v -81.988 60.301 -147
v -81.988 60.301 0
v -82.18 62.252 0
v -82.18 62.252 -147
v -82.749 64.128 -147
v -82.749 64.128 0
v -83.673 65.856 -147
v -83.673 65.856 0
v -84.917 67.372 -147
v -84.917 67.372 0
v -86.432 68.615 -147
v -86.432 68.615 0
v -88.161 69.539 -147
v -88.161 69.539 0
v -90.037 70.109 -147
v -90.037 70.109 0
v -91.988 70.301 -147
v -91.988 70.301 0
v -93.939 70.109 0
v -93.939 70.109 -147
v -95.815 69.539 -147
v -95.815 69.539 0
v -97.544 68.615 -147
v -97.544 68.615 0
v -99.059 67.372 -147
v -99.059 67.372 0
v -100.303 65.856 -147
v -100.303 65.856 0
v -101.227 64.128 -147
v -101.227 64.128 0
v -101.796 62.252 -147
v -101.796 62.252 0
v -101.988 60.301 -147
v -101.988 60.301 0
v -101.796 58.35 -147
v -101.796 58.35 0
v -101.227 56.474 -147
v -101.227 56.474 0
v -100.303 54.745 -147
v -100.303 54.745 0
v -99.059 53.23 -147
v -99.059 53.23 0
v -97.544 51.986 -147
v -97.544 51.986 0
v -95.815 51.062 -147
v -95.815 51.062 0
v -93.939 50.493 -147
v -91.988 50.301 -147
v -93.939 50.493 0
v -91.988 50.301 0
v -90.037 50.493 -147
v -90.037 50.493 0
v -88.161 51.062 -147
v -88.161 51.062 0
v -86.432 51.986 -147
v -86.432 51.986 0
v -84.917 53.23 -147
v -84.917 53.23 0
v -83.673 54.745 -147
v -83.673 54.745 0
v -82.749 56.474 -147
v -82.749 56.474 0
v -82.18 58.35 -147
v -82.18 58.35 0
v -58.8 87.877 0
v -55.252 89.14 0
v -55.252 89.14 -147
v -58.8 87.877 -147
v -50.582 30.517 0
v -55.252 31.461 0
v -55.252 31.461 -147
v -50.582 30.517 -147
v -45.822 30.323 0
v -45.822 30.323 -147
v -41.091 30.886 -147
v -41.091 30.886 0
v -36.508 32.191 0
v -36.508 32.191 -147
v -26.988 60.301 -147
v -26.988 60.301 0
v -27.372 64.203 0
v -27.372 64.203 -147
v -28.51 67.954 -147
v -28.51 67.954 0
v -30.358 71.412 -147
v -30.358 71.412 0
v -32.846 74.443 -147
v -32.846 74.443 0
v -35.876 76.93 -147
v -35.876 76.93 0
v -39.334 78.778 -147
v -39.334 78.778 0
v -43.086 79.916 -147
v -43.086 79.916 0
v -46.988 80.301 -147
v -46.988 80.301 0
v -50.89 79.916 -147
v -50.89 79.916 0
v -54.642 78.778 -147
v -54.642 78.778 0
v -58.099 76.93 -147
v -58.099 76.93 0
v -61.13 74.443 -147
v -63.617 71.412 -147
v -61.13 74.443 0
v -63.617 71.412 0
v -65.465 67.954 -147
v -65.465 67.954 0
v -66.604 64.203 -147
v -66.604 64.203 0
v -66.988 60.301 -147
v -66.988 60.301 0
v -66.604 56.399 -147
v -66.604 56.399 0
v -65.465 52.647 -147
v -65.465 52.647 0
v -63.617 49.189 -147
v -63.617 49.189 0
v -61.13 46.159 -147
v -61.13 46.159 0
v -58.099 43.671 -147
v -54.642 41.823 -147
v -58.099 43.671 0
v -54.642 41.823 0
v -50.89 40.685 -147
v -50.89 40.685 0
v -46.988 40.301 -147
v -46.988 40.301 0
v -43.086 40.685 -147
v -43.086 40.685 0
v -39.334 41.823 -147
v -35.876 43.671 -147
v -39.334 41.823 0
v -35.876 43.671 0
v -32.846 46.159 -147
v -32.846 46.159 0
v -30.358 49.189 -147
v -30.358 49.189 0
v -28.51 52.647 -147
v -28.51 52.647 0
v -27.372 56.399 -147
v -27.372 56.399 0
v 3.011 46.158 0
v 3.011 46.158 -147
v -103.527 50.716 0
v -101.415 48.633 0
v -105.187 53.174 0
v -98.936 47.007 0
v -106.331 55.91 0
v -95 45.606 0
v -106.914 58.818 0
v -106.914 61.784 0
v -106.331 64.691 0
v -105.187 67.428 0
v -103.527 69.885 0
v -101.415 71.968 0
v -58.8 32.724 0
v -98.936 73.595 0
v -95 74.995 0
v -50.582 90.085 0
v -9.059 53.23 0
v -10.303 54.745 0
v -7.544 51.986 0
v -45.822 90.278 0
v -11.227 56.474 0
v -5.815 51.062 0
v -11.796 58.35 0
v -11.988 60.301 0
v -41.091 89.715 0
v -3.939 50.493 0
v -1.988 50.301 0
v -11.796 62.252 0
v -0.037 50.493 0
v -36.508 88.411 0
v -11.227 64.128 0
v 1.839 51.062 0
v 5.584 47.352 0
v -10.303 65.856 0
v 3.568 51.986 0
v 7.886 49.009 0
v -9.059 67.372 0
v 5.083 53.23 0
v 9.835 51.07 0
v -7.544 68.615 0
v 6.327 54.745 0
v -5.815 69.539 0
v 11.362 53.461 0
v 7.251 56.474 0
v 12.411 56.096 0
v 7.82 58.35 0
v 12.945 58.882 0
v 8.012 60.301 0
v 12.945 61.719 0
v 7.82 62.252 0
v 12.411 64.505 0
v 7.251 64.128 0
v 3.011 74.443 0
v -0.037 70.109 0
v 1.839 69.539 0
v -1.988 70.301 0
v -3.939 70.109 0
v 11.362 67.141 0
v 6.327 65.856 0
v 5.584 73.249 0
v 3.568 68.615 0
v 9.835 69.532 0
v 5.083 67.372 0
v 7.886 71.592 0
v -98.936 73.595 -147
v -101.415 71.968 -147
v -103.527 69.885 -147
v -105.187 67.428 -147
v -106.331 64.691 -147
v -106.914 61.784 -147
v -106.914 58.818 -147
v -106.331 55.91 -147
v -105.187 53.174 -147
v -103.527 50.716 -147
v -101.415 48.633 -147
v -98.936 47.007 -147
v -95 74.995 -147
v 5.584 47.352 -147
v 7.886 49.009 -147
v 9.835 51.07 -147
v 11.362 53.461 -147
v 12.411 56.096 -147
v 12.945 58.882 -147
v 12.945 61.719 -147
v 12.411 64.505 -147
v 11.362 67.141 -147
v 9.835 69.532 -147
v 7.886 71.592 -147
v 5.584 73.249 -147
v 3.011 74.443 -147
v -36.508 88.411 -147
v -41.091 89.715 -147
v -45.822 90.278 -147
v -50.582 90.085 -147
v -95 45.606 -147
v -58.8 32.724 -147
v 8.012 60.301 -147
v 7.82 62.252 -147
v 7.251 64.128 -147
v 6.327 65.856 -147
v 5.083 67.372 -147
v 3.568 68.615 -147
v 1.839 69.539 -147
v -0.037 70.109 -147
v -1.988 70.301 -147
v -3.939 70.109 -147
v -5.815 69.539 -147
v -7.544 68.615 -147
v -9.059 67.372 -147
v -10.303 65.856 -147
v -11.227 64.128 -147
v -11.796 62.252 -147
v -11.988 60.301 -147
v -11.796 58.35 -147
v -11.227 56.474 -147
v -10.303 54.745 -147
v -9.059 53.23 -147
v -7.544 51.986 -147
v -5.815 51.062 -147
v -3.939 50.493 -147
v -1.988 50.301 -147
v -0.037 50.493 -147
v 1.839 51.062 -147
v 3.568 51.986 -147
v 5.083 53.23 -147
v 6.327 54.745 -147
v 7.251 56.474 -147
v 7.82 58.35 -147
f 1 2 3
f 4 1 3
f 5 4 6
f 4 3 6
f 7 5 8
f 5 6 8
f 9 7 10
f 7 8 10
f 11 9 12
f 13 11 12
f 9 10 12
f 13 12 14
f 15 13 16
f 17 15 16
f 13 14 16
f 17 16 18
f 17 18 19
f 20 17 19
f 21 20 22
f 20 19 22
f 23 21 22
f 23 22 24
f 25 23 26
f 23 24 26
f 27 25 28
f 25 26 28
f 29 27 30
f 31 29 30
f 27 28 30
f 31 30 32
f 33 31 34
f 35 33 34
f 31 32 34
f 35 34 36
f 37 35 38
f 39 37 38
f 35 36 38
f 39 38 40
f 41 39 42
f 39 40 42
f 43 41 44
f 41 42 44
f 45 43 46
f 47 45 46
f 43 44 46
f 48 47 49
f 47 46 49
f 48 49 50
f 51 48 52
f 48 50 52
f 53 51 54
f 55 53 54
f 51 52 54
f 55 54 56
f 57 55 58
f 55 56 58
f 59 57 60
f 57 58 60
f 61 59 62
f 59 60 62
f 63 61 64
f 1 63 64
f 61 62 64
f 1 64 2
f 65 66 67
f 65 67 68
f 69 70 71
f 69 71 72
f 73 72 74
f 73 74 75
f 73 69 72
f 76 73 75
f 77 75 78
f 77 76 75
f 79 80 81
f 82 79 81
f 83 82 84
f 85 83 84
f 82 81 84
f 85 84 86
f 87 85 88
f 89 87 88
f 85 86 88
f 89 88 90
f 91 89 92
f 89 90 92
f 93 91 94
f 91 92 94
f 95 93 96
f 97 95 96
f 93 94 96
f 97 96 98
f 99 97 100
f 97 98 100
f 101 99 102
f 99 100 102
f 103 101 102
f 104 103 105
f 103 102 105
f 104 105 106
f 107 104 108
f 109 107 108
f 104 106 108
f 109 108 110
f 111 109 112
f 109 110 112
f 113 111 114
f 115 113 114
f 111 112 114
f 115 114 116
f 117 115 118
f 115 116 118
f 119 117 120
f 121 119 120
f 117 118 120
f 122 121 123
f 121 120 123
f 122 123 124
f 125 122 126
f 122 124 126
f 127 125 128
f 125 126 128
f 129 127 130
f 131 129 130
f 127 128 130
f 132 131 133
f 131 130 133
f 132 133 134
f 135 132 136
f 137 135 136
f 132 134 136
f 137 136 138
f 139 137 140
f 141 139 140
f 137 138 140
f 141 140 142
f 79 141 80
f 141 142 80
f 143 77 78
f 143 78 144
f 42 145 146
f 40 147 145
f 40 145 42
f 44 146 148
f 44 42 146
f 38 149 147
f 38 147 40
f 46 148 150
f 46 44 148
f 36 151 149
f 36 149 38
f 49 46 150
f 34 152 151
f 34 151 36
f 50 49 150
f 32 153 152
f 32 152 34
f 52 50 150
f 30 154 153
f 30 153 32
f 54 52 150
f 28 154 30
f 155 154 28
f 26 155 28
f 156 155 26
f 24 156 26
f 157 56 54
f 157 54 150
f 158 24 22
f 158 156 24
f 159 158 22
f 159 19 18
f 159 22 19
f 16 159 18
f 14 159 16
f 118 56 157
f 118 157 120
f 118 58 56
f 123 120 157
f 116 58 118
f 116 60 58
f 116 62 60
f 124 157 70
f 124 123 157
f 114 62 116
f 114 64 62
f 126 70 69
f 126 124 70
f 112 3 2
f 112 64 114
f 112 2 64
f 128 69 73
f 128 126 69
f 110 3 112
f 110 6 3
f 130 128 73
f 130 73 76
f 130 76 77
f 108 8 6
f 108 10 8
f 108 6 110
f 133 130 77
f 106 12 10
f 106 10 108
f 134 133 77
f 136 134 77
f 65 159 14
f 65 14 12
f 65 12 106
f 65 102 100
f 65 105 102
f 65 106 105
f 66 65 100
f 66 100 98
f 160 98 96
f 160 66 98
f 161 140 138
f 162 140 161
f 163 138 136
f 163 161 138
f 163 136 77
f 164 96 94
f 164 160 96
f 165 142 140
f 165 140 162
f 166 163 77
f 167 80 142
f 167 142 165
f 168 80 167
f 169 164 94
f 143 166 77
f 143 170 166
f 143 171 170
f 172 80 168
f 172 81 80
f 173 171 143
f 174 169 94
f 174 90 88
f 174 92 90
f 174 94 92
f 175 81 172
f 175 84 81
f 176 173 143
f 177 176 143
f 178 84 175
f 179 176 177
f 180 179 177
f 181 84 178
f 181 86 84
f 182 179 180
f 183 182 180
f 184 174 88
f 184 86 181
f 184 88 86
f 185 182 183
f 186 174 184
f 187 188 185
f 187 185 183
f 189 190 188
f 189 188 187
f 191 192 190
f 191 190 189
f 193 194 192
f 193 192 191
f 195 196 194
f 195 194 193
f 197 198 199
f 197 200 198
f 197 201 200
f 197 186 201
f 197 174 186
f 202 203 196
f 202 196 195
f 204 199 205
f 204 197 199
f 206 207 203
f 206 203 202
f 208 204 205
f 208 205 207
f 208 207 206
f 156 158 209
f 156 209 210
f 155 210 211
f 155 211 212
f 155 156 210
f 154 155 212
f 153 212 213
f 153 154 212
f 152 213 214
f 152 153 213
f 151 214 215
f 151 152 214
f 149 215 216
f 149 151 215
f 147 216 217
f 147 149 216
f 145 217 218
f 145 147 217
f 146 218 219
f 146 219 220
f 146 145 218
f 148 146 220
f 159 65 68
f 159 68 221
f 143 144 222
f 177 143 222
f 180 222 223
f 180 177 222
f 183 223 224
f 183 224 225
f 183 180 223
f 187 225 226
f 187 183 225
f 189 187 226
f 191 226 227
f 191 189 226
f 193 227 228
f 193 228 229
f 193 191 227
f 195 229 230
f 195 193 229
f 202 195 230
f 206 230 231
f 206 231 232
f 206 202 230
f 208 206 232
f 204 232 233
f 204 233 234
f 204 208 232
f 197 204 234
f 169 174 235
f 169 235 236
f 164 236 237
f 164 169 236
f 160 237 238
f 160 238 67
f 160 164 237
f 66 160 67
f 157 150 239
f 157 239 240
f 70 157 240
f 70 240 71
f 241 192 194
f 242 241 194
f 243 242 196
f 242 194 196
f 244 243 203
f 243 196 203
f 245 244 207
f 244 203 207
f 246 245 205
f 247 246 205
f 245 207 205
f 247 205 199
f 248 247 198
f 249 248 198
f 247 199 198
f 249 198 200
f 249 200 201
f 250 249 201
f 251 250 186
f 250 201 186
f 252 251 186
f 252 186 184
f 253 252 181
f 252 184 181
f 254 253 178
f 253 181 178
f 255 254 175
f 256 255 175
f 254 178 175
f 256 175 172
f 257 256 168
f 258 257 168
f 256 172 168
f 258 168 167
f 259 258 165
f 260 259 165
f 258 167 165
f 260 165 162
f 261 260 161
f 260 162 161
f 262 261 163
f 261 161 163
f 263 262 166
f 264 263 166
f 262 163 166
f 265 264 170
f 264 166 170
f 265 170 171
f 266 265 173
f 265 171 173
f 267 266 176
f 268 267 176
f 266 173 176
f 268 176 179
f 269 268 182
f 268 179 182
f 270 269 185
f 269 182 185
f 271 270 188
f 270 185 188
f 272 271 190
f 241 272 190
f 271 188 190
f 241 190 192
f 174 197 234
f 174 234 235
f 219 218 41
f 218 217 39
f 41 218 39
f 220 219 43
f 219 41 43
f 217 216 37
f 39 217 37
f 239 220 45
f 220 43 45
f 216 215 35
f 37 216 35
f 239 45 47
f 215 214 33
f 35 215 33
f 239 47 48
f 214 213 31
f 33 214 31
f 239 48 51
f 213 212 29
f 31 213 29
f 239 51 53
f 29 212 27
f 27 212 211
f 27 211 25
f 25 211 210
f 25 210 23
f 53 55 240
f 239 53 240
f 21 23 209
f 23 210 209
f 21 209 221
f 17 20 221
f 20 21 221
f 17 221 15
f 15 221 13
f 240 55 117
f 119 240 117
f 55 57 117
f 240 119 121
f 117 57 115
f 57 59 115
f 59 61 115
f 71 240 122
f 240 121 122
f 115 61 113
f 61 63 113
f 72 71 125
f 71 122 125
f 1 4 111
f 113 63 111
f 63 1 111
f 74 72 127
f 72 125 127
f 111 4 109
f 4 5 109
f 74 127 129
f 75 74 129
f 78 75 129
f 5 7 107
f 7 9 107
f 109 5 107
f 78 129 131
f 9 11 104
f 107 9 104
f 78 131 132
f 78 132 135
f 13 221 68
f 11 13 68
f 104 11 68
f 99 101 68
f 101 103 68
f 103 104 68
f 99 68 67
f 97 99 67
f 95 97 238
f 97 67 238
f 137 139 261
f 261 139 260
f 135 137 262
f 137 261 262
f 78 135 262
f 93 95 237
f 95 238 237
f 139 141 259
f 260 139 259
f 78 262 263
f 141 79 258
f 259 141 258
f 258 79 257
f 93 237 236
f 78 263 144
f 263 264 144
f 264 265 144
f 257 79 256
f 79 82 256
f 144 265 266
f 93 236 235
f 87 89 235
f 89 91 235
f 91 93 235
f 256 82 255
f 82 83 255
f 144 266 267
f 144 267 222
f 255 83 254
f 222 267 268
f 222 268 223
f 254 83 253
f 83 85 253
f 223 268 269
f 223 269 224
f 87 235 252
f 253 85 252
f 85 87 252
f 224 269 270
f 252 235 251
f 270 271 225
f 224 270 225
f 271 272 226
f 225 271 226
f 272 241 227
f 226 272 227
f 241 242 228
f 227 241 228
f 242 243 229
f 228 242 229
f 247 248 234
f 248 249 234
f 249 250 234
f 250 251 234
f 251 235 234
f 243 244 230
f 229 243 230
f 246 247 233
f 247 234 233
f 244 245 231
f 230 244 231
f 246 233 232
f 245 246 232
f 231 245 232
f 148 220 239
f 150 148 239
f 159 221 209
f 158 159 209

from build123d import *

# Parameters (mm, degrees)
SKETCH5_R           = 10
SKETCH5_R_2         = 20
BOSS_EXTRUDE1_DEPTH = 147


with BuildPart() as part:
    # Sketch5 → Boss-Extrude1 (new body)
    with BuildSketch(Plane.XY):
        with BuildLine():
            Line((-95.000247062, 74.995110708), (-98.935518445, 73.594697295))
            ThreePointArc((-98.935518445, 73.594697295), (-106.987878642, 60.300702366), (-98.935518445, 47.006707437))
            Line((-98.935518445, 47.006707437), (-95.000247062, 45.606294025))
            Line((-95.000247062, 45.606294025), (-58.799859117, 32.723952789))
            Line((-58.799859117, 32.723952789), (-55.25219854, 31.46147532))
            ThreePointArc((-55.25219854, 31.46147532), (-45.821842976, 30.323371584), (-36.508384931, 32.190558084))
            Line((-36.508384931, 32.190558084), (3.010657963, 46.15804944))
            ThreePointArc((3.010657963, 46.15804944), (13.012121358, 60.300702366), (3.010657963, 74.443355293))
            Line((3.010657963, 74.443355293), (-36.508384931, 88.410846649))
            ThreePointArc((-36.508384931, 88.410846649), (-45.821842976, 90.278033149), (-55.25219854, 89.139929413))
            Line((-55.25219854, 89.139929413), (-58.799859117, 87.877451944))
            Line((-58.799859117, 87.877451944), (-95.000247062, 74.995110708))
        make_face()
        with Locations((-91.987878642, 60.300702366)):
            Circle(SKETCH5_R, mode=Mode.SUBTRACT)
        with Locations((-46.987878642, 60.300702366)):
            Circle(SKETCH5_R_2, mode=Mode.SUBTRACT)
        with Locations((-1.987878642, 60.300702366)):
            Circle(SKETCH5_R, mode=Mode.SUBTRACT)
    extrude(amount=-BOSS_EXTRUDE1_DEPTH)


solid = part.part
